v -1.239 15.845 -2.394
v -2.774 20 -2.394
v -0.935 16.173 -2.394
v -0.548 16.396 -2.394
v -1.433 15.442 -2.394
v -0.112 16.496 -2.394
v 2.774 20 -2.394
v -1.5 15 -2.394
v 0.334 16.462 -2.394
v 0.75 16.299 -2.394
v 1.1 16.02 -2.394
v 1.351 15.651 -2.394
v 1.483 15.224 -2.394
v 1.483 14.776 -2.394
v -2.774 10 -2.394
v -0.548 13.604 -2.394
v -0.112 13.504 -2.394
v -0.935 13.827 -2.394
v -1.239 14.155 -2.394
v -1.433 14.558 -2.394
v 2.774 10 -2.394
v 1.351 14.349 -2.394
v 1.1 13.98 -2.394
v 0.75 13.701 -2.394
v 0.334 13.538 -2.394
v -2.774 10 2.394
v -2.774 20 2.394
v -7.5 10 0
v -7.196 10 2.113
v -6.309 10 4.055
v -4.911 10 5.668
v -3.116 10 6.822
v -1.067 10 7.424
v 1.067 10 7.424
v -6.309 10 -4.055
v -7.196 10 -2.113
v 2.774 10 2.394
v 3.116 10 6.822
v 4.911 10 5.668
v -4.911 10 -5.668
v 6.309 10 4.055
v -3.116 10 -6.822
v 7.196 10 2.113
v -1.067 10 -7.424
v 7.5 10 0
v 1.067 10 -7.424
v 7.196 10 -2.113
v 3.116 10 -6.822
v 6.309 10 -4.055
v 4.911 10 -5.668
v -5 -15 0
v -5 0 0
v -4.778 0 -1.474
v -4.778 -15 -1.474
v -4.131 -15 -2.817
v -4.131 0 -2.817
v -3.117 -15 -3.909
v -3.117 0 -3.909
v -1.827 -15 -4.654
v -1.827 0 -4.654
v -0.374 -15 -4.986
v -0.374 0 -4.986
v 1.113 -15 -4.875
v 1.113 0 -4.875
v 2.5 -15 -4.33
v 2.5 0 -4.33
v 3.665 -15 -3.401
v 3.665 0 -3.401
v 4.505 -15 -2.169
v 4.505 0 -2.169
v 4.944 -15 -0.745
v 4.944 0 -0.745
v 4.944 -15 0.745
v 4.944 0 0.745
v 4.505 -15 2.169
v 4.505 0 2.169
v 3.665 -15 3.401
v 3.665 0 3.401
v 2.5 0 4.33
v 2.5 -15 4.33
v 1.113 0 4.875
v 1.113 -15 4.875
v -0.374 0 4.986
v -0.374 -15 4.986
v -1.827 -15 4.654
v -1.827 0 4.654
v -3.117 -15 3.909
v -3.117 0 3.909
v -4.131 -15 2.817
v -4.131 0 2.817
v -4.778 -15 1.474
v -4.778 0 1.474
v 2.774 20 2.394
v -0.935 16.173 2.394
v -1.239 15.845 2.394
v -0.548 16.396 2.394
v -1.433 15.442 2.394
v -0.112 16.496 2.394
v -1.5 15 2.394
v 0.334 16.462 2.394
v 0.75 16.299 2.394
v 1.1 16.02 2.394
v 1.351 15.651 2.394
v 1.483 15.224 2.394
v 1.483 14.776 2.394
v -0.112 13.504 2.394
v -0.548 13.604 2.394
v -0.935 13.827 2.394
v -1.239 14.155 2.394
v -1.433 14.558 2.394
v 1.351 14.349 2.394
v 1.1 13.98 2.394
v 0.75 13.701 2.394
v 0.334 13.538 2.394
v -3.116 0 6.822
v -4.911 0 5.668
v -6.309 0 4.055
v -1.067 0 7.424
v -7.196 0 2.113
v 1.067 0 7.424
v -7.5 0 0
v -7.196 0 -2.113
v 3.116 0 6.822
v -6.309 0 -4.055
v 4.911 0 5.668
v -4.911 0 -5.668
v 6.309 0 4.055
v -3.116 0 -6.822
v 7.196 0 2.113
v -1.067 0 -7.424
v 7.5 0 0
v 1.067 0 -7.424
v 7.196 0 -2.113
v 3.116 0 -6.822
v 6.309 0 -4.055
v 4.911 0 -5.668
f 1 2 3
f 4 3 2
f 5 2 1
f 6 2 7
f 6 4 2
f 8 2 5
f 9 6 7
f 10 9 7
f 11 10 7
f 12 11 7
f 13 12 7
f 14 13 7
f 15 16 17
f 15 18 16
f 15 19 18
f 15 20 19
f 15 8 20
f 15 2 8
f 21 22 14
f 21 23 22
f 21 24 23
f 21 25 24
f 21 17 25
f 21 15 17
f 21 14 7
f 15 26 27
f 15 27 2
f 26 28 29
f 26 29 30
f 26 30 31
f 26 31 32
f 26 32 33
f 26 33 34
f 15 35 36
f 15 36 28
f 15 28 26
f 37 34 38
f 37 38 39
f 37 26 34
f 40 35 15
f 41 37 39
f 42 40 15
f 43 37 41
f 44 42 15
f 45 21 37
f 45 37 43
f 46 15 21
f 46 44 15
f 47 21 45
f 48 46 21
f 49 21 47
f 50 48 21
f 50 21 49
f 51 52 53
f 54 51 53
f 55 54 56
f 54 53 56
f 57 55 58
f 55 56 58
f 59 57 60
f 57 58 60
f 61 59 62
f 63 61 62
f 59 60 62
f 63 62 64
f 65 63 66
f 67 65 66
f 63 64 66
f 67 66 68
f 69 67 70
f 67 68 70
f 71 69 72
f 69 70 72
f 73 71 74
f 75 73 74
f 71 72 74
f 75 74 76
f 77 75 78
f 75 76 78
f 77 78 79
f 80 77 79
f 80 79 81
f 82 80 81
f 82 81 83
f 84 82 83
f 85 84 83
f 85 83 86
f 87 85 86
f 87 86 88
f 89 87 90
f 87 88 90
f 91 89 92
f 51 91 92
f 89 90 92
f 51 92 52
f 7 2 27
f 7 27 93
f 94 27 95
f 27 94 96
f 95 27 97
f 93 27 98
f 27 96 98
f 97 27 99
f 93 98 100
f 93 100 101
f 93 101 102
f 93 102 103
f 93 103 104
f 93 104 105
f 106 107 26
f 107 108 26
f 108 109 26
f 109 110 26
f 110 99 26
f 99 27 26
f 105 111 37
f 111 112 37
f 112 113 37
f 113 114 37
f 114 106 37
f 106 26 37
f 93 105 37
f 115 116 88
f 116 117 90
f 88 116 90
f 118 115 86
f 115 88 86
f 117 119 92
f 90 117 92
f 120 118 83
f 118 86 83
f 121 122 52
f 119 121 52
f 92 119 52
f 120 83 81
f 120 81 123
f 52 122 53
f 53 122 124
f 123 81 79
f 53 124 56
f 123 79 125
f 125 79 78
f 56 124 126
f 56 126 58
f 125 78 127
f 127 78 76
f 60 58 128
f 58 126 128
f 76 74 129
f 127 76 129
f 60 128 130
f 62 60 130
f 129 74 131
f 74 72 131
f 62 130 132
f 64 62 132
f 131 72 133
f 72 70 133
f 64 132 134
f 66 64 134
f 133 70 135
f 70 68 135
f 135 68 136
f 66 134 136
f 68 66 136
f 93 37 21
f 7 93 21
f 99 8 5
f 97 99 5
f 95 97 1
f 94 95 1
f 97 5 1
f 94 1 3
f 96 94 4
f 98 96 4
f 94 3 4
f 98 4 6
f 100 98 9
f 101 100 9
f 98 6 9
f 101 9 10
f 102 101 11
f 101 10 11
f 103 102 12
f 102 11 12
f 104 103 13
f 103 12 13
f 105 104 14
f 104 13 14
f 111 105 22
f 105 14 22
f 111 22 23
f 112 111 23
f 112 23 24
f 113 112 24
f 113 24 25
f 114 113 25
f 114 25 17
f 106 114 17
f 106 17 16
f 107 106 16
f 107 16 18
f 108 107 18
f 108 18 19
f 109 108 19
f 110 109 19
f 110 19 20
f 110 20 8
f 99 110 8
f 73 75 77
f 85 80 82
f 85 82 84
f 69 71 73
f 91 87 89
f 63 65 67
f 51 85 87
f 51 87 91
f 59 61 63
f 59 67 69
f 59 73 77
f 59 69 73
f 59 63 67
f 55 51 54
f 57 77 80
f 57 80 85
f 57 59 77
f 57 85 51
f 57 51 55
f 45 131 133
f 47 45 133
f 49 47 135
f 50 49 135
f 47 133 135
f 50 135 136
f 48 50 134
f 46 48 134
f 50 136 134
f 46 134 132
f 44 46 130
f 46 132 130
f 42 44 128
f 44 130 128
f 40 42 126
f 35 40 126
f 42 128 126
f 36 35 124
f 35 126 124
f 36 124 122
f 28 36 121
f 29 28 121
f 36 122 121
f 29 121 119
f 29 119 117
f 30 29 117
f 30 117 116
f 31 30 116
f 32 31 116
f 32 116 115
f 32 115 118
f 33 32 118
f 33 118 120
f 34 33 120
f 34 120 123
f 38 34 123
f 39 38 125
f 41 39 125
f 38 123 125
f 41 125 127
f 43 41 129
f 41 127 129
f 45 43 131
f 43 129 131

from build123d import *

# Parameters (mm, degrees)
SKETCH1_R           = 7.5
BOSS_EXTRUDE1_DEPTH = 10
SKETCH2_W           = 5.547326656
SKETCH2_H           = 4.788218798
BOSS_EXTRUDE2_DEPTH = 10
SKETCH4_R           = 1.5
CUT_EXTRUDE1_DEPTH  = 10
SKETCH5_R           = 5
BOSS_EXTRUDE3_DEPTH = 15


with BuildPart() as part:
    # Sketch1 → Boss-Extrude1 (new body)
    with BuildSketch(Plane(origin=(0, 0, 0), x_dir=(1, 0, 0), z_dir=(0, 1, 0))):
        Circle(SKETCH1_R)
    extrude(amount=BOSS_EXTRUDE1_DEPTH)

    # Sketch2 → Boss-Extrude2 (add)
    with BuildSketch(Plane(origin=(0, 10, 0), x_dir=(1, 0, 0), z_dir=(0, 1, 0))):
        Rectangle(SKETCH2_W, SKETCH2_H)
    extrude(amount=BOSS_EXTRUDE2_DEPTH)

    # Sketch4 → Cut-Extrude1 (cut)
    with BuildSketch(Plane(origin=(0, 0, -2.394109399), x_dir=(-1, 0, 0), z_dir=(0, 0, -1))):
        with Locations((0, 15)):
            Circle(SKETCH4_R)
    extrude(amount=-CUT_EXTRUDE1_DEPTH, mode=Mode.SUBTRACT)

    # Sketch5 → Boss-Extrude3 (add)
    with BuildSketch(Plane(origin=(0, 0, 0), x_dir=(-1, 0, 0), z_dir=(0, -1, 0))):
        Circle(SKETCH5_R)
    extrude(amount=BOSS_EXTRUDE3_DEPTH)


solid = part.part
